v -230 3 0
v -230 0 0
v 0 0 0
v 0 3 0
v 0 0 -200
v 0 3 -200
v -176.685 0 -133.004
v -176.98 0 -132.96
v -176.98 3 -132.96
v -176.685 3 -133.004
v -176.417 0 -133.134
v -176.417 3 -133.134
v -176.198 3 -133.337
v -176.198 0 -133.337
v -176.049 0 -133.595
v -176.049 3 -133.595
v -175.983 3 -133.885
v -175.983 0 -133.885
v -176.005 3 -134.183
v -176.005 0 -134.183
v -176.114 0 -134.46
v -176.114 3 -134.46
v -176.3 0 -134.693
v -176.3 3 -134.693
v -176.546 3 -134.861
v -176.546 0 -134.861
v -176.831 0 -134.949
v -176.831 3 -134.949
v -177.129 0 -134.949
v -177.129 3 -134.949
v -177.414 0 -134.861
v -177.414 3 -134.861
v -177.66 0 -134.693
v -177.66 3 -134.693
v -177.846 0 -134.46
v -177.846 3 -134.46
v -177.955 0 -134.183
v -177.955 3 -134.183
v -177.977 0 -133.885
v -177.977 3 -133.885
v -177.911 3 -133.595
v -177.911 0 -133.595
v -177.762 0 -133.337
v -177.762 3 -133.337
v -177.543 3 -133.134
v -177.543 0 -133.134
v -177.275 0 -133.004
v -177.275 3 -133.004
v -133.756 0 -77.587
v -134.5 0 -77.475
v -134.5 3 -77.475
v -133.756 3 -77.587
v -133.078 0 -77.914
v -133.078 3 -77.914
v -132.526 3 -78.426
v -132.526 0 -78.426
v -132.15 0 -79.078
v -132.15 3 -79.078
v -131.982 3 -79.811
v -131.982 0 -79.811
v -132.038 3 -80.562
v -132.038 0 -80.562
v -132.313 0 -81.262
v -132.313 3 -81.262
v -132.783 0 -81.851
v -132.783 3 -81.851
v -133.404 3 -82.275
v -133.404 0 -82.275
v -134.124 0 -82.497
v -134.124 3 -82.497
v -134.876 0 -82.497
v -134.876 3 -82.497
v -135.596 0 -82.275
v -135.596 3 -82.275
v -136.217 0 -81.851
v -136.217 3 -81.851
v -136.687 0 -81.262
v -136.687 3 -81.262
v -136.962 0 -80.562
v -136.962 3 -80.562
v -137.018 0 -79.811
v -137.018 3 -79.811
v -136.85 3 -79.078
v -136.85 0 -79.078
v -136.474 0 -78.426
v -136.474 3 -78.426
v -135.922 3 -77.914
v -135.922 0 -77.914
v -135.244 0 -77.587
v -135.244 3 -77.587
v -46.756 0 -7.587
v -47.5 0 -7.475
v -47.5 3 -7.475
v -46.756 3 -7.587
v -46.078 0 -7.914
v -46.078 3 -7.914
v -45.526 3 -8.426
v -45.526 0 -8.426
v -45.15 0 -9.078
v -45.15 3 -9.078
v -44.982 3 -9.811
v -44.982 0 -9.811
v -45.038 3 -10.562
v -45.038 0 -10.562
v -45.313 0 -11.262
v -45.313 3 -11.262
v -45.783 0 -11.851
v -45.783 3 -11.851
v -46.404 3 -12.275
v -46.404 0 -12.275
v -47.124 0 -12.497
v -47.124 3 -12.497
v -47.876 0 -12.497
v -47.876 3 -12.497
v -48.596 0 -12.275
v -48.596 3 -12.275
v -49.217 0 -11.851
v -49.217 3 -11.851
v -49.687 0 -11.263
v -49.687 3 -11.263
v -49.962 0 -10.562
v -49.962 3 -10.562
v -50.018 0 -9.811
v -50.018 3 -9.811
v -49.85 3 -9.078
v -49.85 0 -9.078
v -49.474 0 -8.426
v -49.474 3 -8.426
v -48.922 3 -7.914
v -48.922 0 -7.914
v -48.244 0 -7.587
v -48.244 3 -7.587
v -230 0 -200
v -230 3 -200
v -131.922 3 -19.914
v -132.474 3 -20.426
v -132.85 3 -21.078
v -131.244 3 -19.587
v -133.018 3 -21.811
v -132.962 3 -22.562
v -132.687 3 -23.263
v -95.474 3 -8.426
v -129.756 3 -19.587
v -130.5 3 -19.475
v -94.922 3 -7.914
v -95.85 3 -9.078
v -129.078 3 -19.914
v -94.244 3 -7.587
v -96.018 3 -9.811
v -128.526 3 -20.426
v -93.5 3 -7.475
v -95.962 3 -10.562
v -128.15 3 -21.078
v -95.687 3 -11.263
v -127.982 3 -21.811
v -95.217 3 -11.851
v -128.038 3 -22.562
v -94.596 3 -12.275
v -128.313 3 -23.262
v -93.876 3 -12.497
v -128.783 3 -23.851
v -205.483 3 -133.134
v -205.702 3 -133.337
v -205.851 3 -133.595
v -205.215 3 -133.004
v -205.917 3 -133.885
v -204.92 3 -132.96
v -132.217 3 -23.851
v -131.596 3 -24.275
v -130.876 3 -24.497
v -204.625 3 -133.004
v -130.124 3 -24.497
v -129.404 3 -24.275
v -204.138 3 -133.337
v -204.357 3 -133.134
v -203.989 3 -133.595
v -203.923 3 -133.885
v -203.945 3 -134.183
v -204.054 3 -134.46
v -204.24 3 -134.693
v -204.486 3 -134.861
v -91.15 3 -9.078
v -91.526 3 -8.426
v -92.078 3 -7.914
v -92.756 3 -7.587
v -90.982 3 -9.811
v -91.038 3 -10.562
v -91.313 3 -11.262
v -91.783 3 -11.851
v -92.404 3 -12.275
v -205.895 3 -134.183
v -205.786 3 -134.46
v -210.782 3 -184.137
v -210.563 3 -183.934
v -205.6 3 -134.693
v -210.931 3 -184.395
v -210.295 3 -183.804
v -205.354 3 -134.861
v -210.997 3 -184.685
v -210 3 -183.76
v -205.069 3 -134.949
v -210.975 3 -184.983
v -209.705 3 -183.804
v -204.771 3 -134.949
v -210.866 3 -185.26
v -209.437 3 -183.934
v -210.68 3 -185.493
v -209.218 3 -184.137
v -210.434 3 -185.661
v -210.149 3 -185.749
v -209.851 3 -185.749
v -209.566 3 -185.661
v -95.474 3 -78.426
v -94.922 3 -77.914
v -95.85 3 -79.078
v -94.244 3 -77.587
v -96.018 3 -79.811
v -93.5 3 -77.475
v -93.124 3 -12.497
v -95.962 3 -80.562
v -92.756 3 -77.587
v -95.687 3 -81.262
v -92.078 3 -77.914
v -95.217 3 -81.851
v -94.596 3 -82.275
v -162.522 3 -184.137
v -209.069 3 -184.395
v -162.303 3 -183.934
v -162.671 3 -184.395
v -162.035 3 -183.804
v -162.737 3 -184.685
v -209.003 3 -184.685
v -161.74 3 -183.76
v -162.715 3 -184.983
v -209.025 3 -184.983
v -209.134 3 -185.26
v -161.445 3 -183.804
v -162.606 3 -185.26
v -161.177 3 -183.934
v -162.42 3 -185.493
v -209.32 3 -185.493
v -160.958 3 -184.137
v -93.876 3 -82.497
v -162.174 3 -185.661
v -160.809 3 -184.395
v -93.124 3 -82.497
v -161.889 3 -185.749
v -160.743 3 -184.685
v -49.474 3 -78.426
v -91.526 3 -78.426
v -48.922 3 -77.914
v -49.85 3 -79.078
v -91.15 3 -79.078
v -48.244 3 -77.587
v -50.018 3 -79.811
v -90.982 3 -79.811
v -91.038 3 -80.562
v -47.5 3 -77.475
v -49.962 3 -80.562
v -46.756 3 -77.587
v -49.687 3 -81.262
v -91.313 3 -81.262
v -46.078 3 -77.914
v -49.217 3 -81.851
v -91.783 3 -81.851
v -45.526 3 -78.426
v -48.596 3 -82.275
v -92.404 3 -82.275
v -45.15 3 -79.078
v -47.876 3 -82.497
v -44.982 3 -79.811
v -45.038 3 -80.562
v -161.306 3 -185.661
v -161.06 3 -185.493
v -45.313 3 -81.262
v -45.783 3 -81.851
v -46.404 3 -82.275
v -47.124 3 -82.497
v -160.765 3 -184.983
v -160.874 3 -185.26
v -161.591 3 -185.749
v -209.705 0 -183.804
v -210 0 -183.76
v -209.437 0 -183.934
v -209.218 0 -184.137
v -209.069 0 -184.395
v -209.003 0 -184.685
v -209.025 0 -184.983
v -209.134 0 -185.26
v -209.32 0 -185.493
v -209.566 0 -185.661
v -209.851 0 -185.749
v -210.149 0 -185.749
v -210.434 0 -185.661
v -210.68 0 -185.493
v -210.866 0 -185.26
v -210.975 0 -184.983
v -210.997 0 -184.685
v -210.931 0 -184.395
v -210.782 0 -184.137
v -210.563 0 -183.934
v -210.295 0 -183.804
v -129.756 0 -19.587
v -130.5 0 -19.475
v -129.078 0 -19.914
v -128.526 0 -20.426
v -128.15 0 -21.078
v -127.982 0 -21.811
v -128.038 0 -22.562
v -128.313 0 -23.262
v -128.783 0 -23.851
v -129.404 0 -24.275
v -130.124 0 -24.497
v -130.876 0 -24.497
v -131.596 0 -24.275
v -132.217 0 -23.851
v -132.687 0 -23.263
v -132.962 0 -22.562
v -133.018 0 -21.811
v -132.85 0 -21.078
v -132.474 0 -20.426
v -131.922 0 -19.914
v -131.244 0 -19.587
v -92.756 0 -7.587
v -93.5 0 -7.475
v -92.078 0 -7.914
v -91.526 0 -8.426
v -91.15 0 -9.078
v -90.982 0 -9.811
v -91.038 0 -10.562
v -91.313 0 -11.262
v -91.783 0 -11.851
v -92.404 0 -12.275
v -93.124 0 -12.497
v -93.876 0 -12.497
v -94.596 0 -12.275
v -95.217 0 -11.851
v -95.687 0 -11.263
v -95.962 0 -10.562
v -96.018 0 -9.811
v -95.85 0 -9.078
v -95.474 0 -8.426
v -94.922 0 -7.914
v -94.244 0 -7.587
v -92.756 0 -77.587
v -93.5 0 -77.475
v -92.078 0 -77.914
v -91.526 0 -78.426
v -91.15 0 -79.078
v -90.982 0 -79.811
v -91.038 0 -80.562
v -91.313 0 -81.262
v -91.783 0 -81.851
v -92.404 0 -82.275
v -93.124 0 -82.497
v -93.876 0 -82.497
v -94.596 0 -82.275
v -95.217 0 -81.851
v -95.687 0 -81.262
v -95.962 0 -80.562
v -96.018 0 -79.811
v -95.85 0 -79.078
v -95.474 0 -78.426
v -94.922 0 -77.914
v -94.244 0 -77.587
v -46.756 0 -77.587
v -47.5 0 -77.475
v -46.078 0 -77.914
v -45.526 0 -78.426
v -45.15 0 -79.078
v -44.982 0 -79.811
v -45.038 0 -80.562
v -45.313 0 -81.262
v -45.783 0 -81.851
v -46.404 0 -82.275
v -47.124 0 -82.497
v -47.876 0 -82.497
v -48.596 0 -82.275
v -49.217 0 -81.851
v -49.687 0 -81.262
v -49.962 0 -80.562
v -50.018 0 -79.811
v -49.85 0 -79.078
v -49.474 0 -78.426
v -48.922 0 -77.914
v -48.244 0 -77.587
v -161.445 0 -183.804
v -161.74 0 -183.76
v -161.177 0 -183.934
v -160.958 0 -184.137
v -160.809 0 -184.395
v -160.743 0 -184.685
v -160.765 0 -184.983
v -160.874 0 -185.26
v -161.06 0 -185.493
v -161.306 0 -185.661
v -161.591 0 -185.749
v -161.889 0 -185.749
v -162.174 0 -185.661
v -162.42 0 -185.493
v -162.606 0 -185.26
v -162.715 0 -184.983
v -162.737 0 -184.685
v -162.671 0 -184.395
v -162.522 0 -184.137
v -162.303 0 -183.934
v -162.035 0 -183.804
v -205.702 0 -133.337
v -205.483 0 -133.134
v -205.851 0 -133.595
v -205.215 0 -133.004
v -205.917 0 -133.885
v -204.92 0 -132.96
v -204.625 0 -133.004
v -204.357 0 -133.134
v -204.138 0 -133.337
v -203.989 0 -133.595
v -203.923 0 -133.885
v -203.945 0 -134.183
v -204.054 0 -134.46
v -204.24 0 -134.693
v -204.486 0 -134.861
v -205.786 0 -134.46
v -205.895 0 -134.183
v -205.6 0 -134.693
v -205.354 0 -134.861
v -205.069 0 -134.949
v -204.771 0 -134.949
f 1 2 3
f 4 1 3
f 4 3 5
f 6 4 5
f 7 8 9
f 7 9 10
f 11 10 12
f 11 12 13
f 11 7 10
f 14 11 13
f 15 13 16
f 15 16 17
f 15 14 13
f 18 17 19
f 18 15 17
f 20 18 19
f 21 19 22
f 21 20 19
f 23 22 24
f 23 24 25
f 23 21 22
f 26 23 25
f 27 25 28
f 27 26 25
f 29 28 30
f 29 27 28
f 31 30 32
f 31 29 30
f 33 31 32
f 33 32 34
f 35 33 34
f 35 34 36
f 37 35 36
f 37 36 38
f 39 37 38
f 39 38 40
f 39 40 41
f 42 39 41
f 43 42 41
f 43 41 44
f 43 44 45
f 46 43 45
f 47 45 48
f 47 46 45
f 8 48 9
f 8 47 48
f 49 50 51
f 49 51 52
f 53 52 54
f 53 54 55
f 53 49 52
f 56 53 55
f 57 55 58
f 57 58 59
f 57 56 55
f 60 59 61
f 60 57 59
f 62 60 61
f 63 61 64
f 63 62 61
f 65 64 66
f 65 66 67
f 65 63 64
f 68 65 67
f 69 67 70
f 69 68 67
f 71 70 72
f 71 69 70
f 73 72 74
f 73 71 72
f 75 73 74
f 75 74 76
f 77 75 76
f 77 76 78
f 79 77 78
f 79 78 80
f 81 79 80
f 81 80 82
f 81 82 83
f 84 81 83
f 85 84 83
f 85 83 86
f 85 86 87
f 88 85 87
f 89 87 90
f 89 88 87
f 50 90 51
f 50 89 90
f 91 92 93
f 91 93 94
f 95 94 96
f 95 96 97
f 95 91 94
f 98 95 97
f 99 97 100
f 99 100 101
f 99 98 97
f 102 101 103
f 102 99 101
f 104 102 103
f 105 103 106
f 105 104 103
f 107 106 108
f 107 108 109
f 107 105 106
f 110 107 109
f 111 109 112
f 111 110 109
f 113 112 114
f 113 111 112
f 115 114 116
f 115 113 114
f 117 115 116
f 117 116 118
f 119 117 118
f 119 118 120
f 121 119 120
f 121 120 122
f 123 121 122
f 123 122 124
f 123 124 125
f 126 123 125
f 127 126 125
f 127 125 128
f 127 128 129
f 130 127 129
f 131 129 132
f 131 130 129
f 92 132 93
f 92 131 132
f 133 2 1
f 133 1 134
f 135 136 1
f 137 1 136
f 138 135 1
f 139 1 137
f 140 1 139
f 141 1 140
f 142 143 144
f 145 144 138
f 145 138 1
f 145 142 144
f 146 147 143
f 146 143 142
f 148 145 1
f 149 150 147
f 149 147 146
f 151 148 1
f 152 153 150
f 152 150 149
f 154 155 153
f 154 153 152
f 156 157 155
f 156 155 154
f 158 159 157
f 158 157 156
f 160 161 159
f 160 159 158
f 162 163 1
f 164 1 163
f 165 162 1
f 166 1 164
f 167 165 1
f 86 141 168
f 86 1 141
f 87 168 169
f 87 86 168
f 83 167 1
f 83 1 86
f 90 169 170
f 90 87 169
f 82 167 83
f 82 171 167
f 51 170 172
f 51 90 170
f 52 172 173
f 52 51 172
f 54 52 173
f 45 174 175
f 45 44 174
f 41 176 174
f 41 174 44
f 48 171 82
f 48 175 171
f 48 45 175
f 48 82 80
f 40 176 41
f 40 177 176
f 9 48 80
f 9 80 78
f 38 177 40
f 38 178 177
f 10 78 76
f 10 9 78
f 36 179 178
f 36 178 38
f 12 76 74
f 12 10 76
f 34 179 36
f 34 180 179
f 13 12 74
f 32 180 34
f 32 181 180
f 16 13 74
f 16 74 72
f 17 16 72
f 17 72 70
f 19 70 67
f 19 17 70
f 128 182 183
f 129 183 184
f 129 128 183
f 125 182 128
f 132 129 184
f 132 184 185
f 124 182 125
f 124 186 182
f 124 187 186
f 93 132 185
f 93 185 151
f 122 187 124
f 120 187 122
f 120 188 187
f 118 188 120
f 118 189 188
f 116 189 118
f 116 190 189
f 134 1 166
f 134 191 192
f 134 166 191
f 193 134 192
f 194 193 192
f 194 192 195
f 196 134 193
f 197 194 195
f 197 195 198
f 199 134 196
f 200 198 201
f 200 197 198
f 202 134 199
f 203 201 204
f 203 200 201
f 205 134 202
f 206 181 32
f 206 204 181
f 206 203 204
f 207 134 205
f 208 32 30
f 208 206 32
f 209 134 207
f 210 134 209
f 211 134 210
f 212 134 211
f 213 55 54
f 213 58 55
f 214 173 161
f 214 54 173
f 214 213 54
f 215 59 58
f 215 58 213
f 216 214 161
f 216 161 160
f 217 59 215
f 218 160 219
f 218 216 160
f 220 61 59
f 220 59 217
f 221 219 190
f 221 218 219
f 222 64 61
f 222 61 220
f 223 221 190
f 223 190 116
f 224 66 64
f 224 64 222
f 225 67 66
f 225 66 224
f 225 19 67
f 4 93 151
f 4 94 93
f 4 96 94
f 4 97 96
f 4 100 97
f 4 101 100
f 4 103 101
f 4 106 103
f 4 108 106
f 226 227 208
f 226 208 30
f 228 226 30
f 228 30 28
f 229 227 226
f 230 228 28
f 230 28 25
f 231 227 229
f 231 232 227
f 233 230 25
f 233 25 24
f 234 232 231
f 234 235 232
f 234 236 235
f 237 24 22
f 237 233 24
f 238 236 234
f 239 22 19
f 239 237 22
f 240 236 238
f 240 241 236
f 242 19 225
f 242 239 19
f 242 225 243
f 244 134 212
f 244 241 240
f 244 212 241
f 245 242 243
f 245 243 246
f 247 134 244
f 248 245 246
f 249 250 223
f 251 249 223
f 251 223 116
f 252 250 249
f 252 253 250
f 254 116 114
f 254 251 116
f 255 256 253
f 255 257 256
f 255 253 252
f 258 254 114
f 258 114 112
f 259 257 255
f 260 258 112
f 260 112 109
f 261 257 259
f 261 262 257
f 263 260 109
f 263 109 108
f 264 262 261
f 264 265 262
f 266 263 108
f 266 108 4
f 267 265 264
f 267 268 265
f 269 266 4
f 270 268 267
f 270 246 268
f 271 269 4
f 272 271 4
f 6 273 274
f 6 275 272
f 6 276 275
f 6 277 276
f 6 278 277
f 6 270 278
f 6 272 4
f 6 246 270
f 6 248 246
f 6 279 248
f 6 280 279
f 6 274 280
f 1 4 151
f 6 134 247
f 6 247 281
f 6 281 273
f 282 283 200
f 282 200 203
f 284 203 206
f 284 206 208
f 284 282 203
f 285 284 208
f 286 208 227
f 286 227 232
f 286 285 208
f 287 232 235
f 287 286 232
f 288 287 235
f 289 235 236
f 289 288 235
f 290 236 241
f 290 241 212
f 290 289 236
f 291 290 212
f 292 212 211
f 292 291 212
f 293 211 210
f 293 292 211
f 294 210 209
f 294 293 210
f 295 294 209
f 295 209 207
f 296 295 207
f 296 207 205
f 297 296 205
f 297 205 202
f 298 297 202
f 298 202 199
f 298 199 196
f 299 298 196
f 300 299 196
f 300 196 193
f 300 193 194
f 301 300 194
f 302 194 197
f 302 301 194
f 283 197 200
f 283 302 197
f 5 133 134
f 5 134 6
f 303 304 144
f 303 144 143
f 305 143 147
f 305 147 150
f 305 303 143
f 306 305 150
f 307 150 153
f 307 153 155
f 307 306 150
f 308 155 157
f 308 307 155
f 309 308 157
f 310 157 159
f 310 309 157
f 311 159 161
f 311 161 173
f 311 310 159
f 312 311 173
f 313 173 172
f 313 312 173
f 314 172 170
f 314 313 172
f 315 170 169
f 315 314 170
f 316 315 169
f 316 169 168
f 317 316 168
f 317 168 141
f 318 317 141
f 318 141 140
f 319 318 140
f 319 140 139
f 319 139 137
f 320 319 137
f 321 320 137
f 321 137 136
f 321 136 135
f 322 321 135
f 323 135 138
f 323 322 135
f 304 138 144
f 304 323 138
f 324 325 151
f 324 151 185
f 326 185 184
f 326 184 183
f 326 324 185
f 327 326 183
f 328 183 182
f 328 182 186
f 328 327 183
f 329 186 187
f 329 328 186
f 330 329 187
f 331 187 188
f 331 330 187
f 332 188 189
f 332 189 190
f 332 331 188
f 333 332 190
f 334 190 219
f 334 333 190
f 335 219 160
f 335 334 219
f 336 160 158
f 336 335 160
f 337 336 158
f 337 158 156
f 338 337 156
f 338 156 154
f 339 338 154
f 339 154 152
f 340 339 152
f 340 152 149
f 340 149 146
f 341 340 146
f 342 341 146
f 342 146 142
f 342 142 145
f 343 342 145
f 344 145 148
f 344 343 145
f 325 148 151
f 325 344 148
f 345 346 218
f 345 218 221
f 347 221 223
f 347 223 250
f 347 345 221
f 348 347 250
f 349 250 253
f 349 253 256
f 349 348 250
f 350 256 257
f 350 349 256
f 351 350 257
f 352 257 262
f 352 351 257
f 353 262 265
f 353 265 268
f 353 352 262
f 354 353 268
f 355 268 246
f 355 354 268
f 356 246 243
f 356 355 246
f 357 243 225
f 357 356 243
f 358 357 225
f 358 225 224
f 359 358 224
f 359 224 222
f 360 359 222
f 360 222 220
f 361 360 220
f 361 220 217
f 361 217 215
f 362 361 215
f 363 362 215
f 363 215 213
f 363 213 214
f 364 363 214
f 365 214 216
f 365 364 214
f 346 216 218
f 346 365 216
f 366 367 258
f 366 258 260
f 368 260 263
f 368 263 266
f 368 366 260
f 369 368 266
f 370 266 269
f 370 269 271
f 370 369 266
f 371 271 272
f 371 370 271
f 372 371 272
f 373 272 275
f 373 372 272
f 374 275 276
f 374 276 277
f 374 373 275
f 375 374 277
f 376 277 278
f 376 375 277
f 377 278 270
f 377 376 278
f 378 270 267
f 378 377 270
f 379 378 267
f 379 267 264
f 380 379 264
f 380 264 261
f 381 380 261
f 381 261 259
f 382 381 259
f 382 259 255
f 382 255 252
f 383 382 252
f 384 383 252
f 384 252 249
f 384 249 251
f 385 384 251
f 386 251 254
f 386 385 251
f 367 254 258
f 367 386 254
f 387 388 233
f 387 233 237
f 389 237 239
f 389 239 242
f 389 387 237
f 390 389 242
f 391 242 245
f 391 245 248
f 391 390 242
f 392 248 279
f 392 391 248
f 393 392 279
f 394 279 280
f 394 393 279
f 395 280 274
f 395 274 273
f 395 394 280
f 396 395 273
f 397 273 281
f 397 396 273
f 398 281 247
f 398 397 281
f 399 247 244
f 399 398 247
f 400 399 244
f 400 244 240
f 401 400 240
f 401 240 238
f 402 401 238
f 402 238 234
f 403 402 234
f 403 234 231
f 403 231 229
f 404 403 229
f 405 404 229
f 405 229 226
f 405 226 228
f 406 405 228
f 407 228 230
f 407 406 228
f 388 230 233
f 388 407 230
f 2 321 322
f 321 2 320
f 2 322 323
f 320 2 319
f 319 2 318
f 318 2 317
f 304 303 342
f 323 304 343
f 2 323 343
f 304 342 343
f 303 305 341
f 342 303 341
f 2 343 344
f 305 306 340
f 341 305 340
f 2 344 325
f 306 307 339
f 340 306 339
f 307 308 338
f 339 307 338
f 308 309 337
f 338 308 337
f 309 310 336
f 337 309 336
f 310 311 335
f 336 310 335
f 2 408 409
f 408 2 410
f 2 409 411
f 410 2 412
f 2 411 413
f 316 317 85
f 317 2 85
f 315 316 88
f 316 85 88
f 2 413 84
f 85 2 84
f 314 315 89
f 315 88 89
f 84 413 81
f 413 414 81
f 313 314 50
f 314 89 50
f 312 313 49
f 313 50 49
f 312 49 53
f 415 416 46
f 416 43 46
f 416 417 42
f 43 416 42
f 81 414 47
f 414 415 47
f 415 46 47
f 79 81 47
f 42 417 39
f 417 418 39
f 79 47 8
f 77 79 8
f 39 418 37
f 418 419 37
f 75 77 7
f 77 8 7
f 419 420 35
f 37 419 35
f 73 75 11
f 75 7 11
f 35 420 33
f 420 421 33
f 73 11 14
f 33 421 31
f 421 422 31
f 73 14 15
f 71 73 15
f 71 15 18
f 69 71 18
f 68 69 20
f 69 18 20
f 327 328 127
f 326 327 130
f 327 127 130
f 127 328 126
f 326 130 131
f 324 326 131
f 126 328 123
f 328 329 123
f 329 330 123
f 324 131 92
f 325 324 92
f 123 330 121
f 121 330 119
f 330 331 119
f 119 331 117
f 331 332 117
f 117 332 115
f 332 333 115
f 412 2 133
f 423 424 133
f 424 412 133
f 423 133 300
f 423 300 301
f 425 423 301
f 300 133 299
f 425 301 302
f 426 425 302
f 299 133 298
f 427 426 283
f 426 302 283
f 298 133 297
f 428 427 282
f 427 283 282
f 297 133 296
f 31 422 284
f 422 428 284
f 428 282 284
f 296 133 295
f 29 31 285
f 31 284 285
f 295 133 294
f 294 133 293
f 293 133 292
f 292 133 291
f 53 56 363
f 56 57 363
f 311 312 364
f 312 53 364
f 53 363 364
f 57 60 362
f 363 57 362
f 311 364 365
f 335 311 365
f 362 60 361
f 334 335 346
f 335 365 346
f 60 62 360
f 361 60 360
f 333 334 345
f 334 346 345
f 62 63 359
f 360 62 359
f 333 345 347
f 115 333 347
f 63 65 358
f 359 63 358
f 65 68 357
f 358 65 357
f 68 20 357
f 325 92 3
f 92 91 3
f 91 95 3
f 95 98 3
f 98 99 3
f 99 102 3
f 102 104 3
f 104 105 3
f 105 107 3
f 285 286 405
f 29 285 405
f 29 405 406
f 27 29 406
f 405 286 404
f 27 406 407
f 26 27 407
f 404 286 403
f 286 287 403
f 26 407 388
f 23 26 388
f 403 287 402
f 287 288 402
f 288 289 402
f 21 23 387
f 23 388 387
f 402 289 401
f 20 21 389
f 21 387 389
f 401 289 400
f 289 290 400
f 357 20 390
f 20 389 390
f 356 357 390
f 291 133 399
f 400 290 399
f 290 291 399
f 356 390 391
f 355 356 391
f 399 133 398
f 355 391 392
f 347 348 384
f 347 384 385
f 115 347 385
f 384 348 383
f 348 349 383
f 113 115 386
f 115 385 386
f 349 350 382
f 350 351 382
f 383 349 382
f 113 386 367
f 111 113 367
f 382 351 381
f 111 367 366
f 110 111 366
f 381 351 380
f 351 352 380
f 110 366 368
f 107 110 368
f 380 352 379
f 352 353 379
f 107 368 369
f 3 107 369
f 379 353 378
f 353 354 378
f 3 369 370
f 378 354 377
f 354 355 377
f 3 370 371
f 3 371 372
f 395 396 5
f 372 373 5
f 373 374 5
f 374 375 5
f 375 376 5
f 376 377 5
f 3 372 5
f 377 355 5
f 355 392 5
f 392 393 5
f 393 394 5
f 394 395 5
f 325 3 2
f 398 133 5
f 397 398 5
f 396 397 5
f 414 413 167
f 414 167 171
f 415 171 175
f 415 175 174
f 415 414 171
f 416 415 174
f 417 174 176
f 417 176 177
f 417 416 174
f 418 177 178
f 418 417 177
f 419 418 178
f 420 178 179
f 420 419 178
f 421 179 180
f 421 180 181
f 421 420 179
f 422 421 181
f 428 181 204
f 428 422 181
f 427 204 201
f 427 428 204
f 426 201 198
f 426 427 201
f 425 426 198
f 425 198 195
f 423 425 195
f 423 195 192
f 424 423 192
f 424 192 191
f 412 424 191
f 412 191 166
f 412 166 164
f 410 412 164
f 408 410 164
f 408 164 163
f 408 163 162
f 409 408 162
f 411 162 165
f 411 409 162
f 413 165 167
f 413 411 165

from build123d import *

# Parameters (mm, degrees)
SKETCH1_W           = 230
SKETCH1_H           = 200
SKETCH1_R           = 2.525
SKETCH1_R_2         = 1
BOSS_EXTRUDE2_DEPTH = 3


with BuildPart() as part:
    # Sketch1 → Boss-Extrude2 (new body)
    with BuildSketch(Plane(origin=(0, 0, 0), x_dir=(1, 0, 0), z_dir=(0, 1, 0))):
        with Locations((-115, 100)):
            Rectangle(SKETCH1_W, SKETCH1_H)
        with Locations(Location((-130.5, 22, 0), (0, 0, 270))):
            Circle(SKETCH1_R, mode=Mode.SUBTRACT)
        with Locations(Location((-93.5, 80, 0), (0, 0, 270))):
            Circle(SKETCH1_R, mode=Mode.SUBTRACT)
        with Locations(Location((-134.5, 80, 0), (0, 0, 270))):
            Circle(SKETCH1_R, mode=Mode.SUBTRACT)
        with Locations(Location((-47.5, 80, 0), (0, 0, 270))):
            Circle(SKETCH1_R, mode=Mode.SUBTRACT)
        with Locations(Location((-47.5, 10, 0), (0, 0, 270))):
            Circle(SKETCH1_R, mode=Mode.SUBTRACT)
        with Locations(Location((-93.5, 10, 0), (0, 0, 270))):
            Circle(SKETCH1_R, mode=Mode.SUBTRACT)
        with Locations(Location((-210, 184.76, 0), (0, 0, 270))):
            Circle(SKETCH1_R_2, mode=Mode.SUBTRACT)
        with Locations(Location((-161.74, 184.76, 0), (0, 0, 270))):
            Circle(SKETCH1_R_2, mode=Mode.SUBTRACT)
        with Locations(Location((-176.98, 133.96, 0), (0, 0, 270))):
            Circle(SKETCH1_R_2, mode=Mode.SUBTRACT)
        with Locations(Location((-204.92, 133.96, 0), (0, 0, 270))):
            Circle(SKETCH1_R_2, mode=Mode.SUBTRACT)
    extrude(amount=BOSS_EXTRUDE2_DEPTH)


solid = part.part
